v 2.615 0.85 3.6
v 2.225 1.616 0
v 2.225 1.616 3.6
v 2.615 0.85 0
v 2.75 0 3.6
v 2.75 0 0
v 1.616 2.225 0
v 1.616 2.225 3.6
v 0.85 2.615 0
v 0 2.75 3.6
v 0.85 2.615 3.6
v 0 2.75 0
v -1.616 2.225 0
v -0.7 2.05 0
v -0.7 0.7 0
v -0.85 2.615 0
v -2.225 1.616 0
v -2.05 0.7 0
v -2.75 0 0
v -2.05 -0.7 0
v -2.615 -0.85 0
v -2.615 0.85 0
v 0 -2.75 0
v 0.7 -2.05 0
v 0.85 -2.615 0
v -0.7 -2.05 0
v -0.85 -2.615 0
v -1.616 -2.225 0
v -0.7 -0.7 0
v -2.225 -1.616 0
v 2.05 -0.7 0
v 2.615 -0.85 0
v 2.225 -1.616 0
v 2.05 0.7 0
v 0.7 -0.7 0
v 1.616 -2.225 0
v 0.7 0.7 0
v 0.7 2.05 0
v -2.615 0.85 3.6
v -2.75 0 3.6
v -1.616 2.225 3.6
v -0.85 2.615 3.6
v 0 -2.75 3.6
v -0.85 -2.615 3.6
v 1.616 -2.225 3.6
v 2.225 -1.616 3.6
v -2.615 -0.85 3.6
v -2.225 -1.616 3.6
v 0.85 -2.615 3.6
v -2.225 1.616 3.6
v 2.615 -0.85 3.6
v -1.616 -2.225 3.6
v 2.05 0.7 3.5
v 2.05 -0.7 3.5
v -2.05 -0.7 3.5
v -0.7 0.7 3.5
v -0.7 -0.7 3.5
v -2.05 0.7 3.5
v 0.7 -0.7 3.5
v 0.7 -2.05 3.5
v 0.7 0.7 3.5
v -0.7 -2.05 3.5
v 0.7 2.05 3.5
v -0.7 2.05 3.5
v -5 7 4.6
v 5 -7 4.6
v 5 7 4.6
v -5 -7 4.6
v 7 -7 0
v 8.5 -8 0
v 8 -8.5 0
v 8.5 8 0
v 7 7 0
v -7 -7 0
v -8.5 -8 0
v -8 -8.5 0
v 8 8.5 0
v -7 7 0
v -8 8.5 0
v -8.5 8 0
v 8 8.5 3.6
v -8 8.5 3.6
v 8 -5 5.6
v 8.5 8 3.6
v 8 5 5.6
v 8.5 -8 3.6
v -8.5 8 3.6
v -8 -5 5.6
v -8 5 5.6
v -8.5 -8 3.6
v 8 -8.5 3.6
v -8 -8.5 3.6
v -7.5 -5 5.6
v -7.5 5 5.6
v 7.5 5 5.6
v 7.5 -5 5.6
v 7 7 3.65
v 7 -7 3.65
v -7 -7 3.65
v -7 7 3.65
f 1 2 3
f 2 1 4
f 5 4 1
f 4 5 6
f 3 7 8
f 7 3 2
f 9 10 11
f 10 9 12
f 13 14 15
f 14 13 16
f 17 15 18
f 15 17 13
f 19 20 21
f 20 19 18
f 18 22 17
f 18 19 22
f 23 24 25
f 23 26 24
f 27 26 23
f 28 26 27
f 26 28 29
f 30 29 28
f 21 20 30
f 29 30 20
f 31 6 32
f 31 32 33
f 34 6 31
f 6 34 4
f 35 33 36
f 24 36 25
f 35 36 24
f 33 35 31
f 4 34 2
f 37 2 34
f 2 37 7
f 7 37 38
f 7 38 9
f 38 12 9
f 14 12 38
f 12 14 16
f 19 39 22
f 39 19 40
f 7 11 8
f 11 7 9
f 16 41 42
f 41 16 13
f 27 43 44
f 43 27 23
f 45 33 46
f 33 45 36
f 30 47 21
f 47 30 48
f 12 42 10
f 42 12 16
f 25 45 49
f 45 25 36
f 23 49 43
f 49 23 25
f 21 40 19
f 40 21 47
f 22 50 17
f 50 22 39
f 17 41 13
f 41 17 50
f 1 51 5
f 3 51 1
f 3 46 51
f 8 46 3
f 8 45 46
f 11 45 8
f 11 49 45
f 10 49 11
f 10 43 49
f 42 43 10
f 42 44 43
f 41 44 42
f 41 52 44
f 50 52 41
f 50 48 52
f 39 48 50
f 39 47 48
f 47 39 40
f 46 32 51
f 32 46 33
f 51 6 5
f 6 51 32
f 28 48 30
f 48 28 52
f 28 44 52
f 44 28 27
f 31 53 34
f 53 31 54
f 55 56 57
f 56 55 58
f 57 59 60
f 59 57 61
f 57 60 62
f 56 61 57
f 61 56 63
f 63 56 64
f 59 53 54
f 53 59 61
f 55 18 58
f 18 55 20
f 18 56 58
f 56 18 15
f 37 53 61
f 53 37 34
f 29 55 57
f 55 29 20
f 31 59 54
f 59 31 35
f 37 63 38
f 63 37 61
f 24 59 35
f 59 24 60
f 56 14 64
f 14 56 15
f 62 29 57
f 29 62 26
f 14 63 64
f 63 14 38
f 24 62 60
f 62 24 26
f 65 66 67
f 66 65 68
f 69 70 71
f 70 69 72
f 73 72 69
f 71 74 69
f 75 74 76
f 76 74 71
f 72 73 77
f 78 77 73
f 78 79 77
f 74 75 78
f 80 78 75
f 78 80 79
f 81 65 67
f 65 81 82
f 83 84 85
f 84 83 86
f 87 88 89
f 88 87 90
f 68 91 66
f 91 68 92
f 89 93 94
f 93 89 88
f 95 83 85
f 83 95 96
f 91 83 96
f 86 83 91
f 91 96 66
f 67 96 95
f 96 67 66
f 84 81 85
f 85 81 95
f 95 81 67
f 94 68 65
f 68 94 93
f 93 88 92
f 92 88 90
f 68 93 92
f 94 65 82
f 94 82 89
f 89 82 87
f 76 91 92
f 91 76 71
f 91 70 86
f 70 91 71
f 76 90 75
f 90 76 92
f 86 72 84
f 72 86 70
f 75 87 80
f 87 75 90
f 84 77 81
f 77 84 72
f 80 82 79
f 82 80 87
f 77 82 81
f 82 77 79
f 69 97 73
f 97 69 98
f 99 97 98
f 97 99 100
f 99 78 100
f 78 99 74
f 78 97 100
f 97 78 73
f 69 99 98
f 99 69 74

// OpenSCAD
// !!! Enable "Thrown Together" view, to see inner sides in purple colour

concaveWidth = 10;
edgeHeight = 2;
fullWidth = 17;
halfWidth = fullWidth/2;
edgeLength = 10;
bevel = 0.5;
halfWidthLessBevel = halfWidth-bevel;
wallHeight = 3.6; // Currently same as stem height
wallThickness = 3;
pegTopThickness = 2;
echo(halfWidth-bevel);

stemDiameter=5.5;
stemHeight = 3.6; // Total travel distance for most MX switches is 3.4mm + 0.2 for infill residue
slotLength = 4.1;
slotWidth = 1.4;
slots = [[slotLength,slotWidth, stemHeight], [slotWidth,slotLength, stemHeight]];

showBoth = true;
showStem = false;

points = [
    // Concave
    [-concaveWidth/2,   7,    1], // concaveFarLeft=0
    [ concaveWidth/2,   7,    1], // concaveFarRight=1
    [-concaveWidth/2,  -7,    1], // concaveNearLeft=2
    [ concaveWidth/2,  -7,    1], // concaveNearRight=3
    
    // Bottom
    [-halfWidth,   halfWidthLessBevel,            0], // bottomFarLeftNear=4
    [-halfWidthLessBevel,             halfWidth,  0], // bottomFarLeftFar=5
    [ halfWidthLessBevel,             halfWidth,  0], // bottomFarRightFar=6
    [ halfWidth,   halfWidthLessBevel,            0], // bottomFarRightNear=7
    [ halfWidth,  -halfWidthLessBevel,            0], // bottomNearRightFar=8
    [ halfWidthLessBevel,            -halfWidth,  0], // bottomNearRightNear=9
    [-halfWidthLessBevel,            -halfWidth,  0], // bottomNearLeftNear=10
    [-halfWidth,  -halfWidthLessBevel,            0], // bottomNearLeftFar=11
    
    // Left Side
    [-halfWidthLessBevel, edgeLength/2,  edgeHeight], // sideFarLeftTop=12
    [-halfWidthLessBevel, -edgeLength/2, edgeHeight], // sideNearLeftTop=13
    
    // Right Side
    [halfWidthLessBevel,  edgeLength/2, edgeHeight], // sideFarRightTop=14
    [halfWidthLessBevel, -edgeLength/2, edgeHeight], // sideNearRightTop=15
    
    // Left Top Edge
    [-7.5, edgeLength/2,  edgeHeight], // leftTopEdgeFar=16
    [-7.5, -edgeLength/2, edgeHeight], // leftTopEdgeNear=17
    
    // Right Top Edge
    [7.5, edgeLength/2,  edgeHeight], // rightTopEdgeFar=18
    [7.5, -edgeLength/2, edgeHeight], // rightTopEdgeNear=19
    
    [ halfWidth,  -halfWidthLessBevel,            -wallHeight], // frontNearRightFar=20
    [ halfWidthLessBevel,            -halfWidth,  -wallHeight], // frontNearRightNear=21
    [-halfWidthLessBevel,            -halfWidth,  -wallHeight], // frontNearLeftNear=22
    [-halfWidth,  -halfWidthLessBevel,            -wallHeight], // frontNearLeftFar=23
    
    [-halfWidth,   halfWidthLessBevel,            -wallHeight], // backFarLeftNear=24
    [-halfWidthLessBevel,             halfWidth,  -wallHeight], // backFarLeftFar=25
    [ halfWidthLessBevel,             halfWidth,  -wallHeight], // backFarRightFar=26
    [ halfWidth,   halfWidthLessBevel,            -wallHeight], // backFarRightNear=27
];

concaveFarLeft = 0;
concaveFarRight = 1;
concaveNearLeft = 2;
concaveNearRight = 3;

bottomFarLeftNear=4;
bottomFarLeftFar=5;
bottomFarRightFar=6;
bottomFarRightNear=7;
bottomNearRightFar=8;
bottomNearRightNear=9;
bottomNearLeftNear=10;
bottomNearLeftFar=11;

sideFarLeftTop=12;
sideNearLeftTop=13;
    
sideFarRightTop=14;
sideNearRightTop=15;

leftTopEdgeFar=16;
leftTopEdgeNear=17;

rightTopEdgeFar=18;
rightTopEdgeNear=19;

frontNearRightFar=20;
frontNearRightNear=21;
frontNearLeftNear=22;
frontNearLeftFar=23;

backFarLeftNear=24;
backFarLeftFar=25;
backFarRightFar=26;
backFarRightNear=27;

faces = [
    [concaveFarLeft, concaveFarRight, concaveNearRight, concaveNearLeft], // Concave plate
    [backFarRightNear, backFarRightFar, backFarLeftFar, backFarLeftNear, frontNearLeftFar, frontNearLeftNear, frontNearRightNear, frontNearRightFar], // Bottom plate
    // [bottomFarRightFar, bottomFarLeftFar, frontNearLeftNear]
    [bottomFarRightFar, concaveFarRight, concaveFarLeft, bottomFarLeftFar], // Rear bevel plate 
    [sideNearRightTop, sideFarRightTop, bottomFarRightNear, bottomNearRightFar], // Right bevel plate 
    [sideFarLeftTop, sideNearLeftTop, bottomNearLeftFar, bottomFarLeftNear], // Left bevel plate
    [bottomNearLeftNear, concaveNearLeft, concaveNearRight, bottomNearRightNear], // Front bevel plate
    [sideFarLeftTop, leftTopEdgeFar, leftTopEdgeNear, sideNearLeftTop], // Left Top Edge
    [rightTopEdgeFar, sideFarRightTop, sideNearRightTop, rightTopEdgeNear], // Right Top Edge
    [rightTopEdgeNear, sideNearRightTop, bottomNearRightNear], // Right Near Edge 1
    [sideNearRightTop, bottomNearRightFar, bottomNearRightNear], // Right Near Edge 2
    [concaveNearRight, rightTopEdgeNear, bottomNearRightNear], // Right Near Edge 3
    [concaveFarRight, rightTopEdgeFar, rightTopEdgeNear, concaveNearRight], // Right concave to edge
    [bottomFarRightNear, sideFarRightTop, bottomFarRightFar], //Right Far Edge 1
    [sideFarRightTop, rightTopEdgeFar, bottomFarRightFar], //Right Far Edge 2
    [concaveFarRight, bottomFarRightFar, rightTopEdgeFar], // Right Far Edge 3
    [concaveNearLeft, leftTopEdgeNear, leftTopEdgeFar, concaveFarLeft], // left concave to edge
    [bottomNearLeftNear, sideNearLeftTop, leftTopEdgeNear], // Left Near Edge 1
    [sideNearLeftTop, bottomNearLeftNear, bottomNearLeftFar], // Left far edge 2
    [leftTopEdgeNear, concaveNearLeft, bottomNearLeftNear], // Left far edge 3
    [bottomFarLeftFar, concaveFarLeft, leftTopEdgeFar], // Left Far Edge 1
    [leftTopEdgeFar, sideFarLeftTop, bottomFarLeftFar], // Left Far Edge 2
    [bottomFarLeftFar, sideFarLeftTop, bottomFarLeftNear], // Left Far Edge 3
    [bottomNearLeftNear, bottomNearRightNear, frontNearRightNear, frontNearLeftNear], // Front
    [bottomNearRightNear, bottomNearRightFar, frontNearRightFar, frontNearRightNear], // Right Front edge
    [bottomNearLeftFar, bottomNearLeftNear, frontNearLeftNear, frontNearLeftFar], // Left Frot Edge
    [bottomNearRightFar, bottomFarRightNear, backFarRightNear, frontNearRightFar], // Right Side
    [bottomFarLeftNear, bottomNearLeftFar, frontNearLeftFar, backFarLeftNear], // Left Side
    [bottomFarRightNear, bottomFarRightFar, backFarRightFar, backFarRightNear], // Right Back Edge
    [bottomFarLeftFar, bottomFarLeftNear, backFarLeftNear, backFarLeftFar], // Left Back Edge
    [bottomFarRightFar, bottomFarLeftFar, backFarLeftFar, backFarRightFar], // Back
];

if (showBoth) {
    stem();
    translate([0,0, stemHeight/2]) cap();
} else if (showStem) {
    stem();
} else {
    cap();
}

module stem() {
    // translate([0,0, stemHeight+(pegTopThickness/2)]) cube([fullWidth-wallThickness-0.1, fullWidth-wallThickness-0.1, pegTopThickness], center=true);
    // stem
    difference() {
        cylinder(stemHeight, d=stemDiameter, $fn=20);
        translate([0,0, stemHeight/2-0.1]) cube(slots[0], center=true);
        translate([0,0, stemHeight/2-0.1]) cube(slots[1], center=true);
    }
}

// translate([fullWidth/2-2, 0, wallHeight-2]) cube([2,2,2]);
module cap() {
    color("grey") translate([0, 0, wallHeight/2]) difference() {
        polyhedron( points, faces);
        translate([0, 0, -(wallHeight/2)])
            cube([fullWidth-wallThickness, fullWidth-wallThickness, wallHeight+0.1], center=true);
    }
    /* translate([fullWidth/2-0.8, 0, wallHeight-pegTopThickness-0.2]) sphere(d=1);
    translate([-fullWidth/2+0.8, 0, wallHeight-pegTopThickness-0.2]) sphere(d=1);*/
}
